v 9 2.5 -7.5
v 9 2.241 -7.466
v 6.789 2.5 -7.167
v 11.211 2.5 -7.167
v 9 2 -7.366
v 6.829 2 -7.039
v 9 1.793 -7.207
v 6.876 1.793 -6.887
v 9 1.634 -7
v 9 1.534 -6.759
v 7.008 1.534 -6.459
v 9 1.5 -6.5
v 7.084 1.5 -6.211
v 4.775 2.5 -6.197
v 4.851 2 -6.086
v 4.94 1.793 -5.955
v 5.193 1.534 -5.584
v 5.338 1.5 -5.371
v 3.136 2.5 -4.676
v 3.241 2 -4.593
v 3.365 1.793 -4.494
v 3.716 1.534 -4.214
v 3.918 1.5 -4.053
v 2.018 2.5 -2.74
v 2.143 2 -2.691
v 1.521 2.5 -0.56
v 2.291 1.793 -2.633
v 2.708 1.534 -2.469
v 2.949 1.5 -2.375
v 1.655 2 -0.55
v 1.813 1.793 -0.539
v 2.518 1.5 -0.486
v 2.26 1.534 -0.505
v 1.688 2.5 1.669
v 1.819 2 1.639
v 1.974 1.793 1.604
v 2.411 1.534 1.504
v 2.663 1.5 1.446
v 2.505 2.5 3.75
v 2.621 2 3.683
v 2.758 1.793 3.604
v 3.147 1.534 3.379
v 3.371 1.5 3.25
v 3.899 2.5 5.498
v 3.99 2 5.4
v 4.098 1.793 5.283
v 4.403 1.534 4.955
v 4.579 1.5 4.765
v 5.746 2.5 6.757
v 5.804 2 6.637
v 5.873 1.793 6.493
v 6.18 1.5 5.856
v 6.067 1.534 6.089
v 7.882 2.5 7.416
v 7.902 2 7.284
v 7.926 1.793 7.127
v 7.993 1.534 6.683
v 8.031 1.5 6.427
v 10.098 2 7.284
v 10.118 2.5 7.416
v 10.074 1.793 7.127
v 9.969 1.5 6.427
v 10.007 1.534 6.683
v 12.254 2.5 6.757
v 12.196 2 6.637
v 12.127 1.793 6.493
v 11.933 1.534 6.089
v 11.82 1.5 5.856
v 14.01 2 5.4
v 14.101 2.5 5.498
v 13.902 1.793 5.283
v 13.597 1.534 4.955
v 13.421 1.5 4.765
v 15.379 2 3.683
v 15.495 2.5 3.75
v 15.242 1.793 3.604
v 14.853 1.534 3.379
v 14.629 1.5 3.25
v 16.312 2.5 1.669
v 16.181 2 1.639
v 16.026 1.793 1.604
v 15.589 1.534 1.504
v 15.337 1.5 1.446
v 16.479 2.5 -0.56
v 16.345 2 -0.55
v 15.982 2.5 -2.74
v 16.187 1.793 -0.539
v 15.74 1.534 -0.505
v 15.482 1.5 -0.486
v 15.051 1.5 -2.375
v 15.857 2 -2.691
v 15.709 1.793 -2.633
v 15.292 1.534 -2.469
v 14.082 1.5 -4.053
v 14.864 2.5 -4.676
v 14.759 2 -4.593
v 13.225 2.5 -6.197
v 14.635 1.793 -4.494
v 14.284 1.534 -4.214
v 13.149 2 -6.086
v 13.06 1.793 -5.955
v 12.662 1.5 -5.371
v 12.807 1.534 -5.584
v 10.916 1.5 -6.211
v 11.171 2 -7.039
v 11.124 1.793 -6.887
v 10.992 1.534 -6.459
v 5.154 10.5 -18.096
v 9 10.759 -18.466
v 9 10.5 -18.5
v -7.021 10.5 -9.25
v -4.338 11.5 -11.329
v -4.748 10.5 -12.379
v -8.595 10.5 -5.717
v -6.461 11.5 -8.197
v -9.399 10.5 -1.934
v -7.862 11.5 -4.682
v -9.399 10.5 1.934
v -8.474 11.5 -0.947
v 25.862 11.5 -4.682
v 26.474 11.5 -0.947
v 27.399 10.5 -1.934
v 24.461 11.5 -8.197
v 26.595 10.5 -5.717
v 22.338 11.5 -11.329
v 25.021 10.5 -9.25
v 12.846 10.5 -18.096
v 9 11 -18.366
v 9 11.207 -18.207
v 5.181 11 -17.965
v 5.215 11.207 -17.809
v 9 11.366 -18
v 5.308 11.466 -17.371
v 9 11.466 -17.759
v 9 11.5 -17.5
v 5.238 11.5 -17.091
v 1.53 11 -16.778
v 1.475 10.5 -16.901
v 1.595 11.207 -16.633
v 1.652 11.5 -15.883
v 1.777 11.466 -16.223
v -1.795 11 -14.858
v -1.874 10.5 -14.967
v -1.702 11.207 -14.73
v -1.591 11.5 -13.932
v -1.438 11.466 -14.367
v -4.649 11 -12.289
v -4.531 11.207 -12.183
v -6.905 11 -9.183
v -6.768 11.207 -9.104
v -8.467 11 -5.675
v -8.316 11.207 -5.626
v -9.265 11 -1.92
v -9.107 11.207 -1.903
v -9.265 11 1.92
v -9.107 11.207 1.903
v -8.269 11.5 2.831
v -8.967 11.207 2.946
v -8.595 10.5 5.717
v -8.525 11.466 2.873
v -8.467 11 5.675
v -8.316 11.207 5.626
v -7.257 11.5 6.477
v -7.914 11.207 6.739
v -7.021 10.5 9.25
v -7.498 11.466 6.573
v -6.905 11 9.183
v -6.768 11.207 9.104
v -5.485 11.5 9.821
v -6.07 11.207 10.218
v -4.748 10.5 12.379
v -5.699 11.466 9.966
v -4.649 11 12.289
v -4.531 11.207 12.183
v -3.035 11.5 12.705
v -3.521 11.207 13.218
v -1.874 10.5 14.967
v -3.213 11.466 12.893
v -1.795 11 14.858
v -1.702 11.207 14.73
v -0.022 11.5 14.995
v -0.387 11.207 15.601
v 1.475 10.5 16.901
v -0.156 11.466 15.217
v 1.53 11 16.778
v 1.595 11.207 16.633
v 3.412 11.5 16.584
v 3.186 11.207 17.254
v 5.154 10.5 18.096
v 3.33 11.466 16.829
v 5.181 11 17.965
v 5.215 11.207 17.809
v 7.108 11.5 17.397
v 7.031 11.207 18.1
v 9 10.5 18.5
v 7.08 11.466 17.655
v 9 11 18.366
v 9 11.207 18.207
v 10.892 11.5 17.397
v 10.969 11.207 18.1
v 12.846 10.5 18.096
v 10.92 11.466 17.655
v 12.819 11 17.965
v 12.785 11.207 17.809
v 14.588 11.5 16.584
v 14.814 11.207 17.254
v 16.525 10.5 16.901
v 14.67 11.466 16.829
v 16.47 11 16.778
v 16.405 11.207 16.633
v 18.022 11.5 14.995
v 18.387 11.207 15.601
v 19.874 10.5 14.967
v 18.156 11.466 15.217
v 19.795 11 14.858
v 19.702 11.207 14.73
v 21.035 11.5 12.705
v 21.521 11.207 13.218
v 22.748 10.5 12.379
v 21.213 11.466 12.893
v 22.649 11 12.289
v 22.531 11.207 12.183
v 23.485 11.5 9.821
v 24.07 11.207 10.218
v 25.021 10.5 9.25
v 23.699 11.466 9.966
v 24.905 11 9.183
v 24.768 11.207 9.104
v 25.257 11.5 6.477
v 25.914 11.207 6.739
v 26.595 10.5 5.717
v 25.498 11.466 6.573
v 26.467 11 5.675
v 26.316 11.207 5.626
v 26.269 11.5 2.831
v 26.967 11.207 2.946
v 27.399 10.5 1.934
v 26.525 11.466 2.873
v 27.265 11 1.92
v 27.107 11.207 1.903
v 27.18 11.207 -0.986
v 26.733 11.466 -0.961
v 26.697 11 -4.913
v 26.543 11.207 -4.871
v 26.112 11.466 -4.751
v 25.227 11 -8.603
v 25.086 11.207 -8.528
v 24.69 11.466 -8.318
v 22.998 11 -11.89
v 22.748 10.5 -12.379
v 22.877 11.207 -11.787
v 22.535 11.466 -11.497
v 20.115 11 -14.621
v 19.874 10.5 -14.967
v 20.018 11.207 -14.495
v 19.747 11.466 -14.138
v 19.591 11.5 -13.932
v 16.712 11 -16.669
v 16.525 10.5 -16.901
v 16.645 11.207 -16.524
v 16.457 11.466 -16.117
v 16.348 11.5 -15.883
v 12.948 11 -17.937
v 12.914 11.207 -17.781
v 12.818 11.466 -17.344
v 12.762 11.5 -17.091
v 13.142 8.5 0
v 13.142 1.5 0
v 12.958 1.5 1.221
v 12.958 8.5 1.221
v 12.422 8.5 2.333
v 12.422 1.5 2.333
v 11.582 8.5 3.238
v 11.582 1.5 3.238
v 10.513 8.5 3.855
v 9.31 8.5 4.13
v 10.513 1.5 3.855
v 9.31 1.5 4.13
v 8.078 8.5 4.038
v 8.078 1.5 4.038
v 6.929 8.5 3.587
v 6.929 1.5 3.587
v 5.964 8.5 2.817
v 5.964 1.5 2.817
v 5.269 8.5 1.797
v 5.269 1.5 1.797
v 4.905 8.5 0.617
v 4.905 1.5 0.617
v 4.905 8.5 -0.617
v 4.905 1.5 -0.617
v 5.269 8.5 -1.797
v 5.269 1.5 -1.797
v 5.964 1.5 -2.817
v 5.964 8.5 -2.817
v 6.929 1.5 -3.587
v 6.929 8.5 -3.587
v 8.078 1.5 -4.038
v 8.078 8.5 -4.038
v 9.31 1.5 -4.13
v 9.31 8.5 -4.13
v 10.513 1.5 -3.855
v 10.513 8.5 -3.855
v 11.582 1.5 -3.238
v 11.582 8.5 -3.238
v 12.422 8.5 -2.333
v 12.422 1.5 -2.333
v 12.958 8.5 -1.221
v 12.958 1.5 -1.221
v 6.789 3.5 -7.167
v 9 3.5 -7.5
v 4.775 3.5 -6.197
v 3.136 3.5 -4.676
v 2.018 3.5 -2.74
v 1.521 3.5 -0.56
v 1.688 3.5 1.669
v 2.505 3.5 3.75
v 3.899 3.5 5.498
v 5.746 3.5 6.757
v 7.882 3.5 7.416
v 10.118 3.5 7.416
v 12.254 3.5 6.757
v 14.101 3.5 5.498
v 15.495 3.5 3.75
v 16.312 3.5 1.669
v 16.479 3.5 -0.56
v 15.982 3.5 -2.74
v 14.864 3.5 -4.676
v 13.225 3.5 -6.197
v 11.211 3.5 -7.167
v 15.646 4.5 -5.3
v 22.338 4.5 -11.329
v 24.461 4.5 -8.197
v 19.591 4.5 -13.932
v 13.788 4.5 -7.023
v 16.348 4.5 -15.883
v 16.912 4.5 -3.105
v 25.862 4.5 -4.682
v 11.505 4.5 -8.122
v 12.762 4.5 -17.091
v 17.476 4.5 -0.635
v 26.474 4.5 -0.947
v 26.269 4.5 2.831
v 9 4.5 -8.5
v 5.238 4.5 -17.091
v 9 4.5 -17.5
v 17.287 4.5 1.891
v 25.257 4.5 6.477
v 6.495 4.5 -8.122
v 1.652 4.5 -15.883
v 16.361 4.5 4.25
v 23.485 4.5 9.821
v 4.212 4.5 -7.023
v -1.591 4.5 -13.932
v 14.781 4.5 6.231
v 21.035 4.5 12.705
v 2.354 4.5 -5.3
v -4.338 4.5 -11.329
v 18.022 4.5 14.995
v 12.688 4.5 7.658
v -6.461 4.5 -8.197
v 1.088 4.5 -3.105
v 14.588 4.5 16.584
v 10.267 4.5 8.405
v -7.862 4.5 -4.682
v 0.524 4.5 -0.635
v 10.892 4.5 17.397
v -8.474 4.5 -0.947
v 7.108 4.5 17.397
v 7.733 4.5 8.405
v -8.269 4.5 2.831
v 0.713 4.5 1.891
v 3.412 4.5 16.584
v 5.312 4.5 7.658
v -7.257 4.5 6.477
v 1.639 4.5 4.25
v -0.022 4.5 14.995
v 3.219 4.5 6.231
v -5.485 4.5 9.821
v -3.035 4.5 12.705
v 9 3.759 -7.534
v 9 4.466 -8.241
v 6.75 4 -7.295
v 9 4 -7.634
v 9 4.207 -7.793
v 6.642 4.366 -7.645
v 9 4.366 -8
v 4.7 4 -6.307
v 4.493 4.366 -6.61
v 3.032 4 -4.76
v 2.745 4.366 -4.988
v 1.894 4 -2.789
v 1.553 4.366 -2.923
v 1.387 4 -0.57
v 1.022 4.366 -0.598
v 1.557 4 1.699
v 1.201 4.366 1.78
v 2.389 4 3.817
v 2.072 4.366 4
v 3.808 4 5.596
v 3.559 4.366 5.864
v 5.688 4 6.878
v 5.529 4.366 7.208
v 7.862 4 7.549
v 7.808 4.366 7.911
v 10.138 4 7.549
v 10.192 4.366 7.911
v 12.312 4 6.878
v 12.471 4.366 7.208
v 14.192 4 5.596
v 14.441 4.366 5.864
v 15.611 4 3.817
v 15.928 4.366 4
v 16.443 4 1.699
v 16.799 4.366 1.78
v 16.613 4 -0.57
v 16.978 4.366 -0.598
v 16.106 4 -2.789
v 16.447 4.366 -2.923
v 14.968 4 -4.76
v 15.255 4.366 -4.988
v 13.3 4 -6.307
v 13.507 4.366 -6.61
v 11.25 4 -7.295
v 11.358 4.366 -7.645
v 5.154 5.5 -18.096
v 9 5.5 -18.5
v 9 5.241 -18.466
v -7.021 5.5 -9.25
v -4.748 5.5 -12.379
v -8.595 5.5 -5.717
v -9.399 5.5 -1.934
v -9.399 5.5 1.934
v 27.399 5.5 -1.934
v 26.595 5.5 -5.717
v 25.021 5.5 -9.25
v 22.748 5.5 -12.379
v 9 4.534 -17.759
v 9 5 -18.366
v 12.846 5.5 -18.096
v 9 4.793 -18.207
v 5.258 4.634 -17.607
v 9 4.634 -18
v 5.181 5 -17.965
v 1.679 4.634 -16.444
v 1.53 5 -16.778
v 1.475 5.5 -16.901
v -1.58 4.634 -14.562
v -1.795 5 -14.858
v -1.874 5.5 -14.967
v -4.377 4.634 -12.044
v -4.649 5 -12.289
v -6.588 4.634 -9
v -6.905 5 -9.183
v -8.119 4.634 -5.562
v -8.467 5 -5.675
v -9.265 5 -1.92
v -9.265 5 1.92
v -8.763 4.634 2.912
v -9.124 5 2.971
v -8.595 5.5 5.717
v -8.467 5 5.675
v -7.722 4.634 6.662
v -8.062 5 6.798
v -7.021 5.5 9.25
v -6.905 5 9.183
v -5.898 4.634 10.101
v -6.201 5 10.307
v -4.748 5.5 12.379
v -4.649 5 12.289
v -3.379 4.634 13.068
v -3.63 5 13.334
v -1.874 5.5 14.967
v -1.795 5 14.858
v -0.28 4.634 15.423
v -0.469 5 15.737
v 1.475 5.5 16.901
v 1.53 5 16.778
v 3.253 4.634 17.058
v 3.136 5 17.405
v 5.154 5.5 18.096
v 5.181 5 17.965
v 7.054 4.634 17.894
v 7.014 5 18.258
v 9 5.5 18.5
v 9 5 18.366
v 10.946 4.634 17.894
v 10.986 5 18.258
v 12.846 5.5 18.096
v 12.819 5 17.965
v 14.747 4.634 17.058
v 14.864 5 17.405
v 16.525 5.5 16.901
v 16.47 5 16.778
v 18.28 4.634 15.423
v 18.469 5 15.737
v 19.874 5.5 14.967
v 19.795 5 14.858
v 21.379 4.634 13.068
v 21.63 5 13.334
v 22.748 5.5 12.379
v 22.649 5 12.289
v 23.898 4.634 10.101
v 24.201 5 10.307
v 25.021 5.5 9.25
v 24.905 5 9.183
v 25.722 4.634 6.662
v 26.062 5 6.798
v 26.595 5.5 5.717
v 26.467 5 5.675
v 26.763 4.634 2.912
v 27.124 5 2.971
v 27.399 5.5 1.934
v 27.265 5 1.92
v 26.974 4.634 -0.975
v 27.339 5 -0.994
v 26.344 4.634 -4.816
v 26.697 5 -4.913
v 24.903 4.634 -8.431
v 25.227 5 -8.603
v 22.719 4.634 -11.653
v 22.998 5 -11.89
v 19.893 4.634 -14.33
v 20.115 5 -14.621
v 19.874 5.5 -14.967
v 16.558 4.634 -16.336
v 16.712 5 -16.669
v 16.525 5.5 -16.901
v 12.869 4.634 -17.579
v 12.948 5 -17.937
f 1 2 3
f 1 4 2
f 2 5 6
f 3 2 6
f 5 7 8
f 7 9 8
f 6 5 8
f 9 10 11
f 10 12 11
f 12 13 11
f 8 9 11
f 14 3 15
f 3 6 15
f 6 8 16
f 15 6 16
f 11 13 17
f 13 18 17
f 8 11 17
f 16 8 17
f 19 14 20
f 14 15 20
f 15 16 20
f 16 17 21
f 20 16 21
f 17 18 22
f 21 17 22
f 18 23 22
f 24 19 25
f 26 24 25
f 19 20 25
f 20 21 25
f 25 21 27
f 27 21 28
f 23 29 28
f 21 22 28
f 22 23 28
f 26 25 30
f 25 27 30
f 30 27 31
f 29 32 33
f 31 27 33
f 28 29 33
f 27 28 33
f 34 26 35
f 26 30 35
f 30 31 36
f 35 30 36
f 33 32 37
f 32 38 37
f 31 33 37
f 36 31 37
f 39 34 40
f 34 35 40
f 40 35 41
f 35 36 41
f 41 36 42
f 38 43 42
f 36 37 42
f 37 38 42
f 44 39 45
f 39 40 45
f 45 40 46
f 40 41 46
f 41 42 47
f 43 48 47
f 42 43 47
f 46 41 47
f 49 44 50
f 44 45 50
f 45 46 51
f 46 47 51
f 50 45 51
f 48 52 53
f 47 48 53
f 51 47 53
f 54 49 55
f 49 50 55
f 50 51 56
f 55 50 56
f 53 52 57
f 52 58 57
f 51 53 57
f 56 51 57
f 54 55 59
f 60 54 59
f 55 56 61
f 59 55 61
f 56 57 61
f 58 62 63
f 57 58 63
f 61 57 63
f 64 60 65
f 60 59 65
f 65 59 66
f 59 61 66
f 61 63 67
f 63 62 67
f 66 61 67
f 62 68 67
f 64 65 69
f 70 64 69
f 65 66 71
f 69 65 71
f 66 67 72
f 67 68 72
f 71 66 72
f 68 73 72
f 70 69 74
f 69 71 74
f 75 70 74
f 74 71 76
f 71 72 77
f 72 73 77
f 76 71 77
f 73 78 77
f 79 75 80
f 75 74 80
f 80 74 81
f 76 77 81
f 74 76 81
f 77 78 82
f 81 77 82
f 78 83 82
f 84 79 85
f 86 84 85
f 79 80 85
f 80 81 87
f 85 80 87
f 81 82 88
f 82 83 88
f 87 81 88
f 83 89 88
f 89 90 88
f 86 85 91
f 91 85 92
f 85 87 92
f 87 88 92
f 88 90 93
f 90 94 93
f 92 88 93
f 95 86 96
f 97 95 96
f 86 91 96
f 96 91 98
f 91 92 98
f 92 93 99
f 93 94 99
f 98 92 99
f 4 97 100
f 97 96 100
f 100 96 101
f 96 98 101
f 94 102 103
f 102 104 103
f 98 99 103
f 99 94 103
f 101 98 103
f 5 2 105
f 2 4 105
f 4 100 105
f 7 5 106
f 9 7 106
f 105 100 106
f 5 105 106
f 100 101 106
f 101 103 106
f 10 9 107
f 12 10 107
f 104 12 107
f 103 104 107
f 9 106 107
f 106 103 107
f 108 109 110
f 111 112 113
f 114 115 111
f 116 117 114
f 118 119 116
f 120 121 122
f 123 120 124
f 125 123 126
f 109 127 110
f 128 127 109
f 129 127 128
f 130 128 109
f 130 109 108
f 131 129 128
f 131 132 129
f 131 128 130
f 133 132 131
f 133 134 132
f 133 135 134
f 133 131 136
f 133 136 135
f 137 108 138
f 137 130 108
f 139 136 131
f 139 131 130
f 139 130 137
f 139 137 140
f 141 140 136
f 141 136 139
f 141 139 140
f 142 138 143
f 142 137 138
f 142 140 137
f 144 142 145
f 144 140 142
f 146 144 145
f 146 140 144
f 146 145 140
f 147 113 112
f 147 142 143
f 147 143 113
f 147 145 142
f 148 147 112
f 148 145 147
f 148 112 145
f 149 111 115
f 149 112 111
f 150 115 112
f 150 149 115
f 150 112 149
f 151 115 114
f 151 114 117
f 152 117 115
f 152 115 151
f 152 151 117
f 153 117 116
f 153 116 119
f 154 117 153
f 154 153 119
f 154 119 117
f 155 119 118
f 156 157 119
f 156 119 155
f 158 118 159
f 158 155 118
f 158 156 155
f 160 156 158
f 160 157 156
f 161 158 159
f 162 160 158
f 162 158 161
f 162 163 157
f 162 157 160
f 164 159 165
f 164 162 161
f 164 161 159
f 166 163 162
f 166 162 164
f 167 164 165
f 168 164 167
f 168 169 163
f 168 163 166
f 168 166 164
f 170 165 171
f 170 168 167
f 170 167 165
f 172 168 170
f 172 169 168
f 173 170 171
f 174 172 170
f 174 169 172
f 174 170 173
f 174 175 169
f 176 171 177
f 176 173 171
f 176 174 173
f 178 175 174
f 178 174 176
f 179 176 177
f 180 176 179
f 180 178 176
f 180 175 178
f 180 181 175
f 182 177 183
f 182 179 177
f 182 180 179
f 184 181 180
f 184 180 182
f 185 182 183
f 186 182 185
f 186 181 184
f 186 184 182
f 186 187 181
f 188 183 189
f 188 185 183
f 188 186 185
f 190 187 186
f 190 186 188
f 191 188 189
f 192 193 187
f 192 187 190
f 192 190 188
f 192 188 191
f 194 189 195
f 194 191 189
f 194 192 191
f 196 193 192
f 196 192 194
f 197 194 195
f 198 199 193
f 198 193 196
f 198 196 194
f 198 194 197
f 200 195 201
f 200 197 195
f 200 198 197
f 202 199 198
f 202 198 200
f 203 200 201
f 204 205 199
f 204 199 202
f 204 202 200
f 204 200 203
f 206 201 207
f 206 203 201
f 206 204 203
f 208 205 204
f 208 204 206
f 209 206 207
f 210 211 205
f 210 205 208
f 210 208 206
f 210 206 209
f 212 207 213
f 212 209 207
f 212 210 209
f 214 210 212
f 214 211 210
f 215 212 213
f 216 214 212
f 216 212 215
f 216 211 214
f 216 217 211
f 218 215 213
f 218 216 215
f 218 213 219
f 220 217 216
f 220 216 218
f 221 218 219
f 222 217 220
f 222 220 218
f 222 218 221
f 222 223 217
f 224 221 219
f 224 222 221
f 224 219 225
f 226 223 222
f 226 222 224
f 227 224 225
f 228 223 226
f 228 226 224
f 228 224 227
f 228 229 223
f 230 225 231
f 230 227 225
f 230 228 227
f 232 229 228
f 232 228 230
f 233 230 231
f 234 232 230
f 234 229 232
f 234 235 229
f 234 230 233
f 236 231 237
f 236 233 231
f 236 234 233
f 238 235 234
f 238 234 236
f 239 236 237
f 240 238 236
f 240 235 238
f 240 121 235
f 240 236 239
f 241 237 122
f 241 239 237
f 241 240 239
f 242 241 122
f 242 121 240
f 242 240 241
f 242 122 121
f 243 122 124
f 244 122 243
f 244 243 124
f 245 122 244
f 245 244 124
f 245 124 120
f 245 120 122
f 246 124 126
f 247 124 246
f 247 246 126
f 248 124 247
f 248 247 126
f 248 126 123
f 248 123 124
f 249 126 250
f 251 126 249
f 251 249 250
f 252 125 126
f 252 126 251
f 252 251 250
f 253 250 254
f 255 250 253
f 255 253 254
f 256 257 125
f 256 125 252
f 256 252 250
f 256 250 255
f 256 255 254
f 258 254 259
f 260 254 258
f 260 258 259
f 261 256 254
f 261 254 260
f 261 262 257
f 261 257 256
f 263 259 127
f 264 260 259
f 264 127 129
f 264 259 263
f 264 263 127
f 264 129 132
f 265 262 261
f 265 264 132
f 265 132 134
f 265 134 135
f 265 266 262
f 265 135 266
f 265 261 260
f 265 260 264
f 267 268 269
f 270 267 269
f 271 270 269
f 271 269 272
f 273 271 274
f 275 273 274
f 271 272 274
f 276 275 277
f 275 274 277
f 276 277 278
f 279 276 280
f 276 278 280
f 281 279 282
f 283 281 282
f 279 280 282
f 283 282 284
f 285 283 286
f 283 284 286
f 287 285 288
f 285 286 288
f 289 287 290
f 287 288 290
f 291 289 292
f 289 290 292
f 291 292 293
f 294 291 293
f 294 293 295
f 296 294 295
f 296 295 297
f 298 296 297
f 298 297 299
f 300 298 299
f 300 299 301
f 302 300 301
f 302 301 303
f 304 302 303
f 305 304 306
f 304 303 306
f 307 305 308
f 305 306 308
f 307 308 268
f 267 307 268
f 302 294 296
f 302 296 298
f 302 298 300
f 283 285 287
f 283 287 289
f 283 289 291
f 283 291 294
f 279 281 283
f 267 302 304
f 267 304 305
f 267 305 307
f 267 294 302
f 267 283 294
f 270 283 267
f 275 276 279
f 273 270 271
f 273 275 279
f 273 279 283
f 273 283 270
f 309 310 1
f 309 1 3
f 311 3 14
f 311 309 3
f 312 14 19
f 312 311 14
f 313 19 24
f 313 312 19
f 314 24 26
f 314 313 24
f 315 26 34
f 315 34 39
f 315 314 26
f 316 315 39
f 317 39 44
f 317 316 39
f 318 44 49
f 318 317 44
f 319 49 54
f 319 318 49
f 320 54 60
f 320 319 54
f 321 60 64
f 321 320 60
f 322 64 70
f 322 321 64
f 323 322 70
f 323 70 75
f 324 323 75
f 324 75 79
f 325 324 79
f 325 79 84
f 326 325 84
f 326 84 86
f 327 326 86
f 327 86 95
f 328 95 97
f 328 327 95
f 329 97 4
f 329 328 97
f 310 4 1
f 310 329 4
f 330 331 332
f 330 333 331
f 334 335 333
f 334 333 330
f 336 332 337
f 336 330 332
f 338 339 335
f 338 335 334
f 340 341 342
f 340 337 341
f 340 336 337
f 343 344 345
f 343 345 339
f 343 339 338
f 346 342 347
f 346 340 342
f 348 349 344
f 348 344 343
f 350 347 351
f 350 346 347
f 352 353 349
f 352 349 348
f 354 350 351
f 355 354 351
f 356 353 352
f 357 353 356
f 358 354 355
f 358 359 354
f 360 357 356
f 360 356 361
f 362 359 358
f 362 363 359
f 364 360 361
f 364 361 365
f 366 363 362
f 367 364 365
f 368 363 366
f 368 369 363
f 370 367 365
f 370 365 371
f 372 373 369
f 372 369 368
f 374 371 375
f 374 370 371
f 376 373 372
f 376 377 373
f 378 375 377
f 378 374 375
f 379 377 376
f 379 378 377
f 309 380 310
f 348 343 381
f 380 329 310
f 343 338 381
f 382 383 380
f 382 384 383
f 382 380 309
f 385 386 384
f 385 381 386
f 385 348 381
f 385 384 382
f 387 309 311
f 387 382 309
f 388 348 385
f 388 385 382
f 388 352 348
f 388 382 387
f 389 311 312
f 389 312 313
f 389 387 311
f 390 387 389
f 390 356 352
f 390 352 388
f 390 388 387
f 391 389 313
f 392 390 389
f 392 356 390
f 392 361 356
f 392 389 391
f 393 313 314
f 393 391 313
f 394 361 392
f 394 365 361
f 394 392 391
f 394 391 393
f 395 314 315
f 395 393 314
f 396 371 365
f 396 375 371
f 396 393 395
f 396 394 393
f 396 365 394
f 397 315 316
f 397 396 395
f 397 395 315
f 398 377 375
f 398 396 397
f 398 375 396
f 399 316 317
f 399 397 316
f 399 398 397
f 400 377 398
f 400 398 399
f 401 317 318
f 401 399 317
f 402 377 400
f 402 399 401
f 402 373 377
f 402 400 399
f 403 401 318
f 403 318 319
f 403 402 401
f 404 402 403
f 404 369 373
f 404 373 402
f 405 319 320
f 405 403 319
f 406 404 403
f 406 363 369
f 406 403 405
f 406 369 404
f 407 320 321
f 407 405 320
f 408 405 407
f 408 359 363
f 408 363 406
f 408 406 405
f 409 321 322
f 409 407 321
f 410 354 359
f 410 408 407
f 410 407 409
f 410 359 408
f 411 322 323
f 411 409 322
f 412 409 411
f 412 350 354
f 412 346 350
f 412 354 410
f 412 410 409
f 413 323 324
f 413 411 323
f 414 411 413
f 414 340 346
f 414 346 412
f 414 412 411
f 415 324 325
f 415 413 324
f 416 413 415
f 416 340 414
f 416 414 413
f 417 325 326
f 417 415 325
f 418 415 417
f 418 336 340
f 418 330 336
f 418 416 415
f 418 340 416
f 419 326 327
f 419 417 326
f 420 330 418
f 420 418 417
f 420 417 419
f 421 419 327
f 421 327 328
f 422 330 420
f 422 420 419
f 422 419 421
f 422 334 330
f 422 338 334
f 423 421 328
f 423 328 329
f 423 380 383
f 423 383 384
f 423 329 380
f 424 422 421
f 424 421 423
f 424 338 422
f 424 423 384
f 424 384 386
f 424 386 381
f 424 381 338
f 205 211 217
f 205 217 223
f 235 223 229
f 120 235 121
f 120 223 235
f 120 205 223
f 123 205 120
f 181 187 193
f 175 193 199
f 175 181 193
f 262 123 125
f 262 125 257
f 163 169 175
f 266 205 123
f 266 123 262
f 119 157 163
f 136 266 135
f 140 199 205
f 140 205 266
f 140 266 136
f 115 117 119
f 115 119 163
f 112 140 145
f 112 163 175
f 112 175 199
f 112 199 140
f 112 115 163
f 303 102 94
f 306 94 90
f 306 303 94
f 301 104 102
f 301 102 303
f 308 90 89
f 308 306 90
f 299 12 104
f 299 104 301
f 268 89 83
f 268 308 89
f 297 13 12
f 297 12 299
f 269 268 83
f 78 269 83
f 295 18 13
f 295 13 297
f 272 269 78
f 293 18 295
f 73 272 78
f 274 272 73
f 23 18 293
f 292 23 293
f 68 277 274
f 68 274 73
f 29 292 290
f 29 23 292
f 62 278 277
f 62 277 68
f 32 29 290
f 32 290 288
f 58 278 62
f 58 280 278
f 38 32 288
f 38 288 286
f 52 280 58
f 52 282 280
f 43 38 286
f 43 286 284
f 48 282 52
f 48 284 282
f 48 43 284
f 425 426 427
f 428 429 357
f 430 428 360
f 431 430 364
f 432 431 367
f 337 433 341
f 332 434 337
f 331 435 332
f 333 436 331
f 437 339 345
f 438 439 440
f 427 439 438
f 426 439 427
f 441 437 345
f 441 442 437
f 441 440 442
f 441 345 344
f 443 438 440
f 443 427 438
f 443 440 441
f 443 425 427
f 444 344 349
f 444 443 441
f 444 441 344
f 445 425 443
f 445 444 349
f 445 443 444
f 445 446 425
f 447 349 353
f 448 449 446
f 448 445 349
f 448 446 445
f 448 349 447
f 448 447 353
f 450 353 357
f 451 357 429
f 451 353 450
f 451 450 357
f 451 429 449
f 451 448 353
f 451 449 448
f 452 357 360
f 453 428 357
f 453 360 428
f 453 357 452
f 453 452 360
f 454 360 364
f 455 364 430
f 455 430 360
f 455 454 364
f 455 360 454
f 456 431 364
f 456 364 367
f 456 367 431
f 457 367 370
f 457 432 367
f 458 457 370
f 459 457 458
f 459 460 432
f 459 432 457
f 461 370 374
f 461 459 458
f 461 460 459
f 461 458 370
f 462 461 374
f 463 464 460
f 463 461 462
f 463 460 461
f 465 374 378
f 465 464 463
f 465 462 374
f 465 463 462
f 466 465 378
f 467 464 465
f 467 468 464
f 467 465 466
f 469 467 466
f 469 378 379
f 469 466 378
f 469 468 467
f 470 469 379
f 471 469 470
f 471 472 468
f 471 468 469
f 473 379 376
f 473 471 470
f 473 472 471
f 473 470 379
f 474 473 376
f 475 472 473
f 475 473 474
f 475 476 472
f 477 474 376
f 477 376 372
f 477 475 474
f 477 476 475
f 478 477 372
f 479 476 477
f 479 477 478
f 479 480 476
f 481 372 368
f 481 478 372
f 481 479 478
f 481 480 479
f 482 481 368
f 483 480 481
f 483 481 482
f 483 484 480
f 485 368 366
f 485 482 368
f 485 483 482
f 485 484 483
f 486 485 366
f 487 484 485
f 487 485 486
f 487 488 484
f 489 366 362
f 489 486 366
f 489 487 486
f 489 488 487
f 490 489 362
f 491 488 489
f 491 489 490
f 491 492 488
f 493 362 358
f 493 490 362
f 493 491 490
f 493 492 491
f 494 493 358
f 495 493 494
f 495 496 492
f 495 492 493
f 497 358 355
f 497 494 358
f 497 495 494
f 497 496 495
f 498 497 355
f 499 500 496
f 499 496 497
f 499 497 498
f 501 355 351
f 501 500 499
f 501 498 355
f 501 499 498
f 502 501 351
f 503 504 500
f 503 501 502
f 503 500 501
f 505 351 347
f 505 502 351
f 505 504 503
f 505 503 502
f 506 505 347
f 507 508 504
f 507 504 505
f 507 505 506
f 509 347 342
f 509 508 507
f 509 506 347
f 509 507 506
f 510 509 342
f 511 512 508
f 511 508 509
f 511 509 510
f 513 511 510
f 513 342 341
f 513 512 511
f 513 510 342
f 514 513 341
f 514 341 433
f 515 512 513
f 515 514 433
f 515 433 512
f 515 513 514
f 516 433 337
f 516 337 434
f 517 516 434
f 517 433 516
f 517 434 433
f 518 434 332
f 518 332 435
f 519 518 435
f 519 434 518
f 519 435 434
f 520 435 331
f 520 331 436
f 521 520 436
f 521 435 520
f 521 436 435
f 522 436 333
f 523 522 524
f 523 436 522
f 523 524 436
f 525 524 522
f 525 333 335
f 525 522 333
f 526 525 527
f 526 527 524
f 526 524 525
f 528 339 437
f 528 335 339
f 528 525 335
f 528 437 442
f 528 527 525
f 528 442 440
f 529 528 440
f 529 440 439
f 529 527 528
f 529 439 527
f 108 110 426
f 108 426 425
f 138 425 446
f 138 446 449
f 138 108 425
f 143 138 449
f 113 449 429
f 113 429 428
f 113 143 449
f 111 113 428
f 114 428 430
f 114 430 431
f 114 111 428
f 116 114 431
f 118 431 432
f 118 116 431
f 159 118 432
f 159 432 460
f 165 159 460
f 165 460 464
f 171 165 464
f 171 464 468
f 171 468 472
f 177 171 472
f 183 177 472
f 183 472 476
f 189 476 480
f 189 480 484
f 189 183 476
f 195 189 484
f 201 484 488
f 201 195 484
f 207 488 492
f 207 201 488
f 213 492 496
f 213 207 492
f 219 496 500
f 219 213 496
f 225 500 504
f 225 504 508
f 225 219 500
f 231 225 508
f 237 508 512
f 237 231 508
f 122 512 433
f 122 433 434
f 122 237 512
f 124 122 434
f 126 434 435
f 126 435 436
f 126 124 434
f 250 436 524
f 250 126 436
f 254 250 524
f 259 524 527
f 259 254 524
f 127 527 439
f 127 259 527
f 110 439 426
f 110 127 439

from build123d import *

# Parameters (mm, degrees)
SKETCH3_R          = 4.141637382
CUT_EXTRUDE1_DEPTH = 7
FILLET2_R          = 1
FILLET3_R          = 1


with BuildPart() as part:
    # Sketch2 → Revolve1 (revolve)
    with BuildSketch(Plane.XY, mode=Mode.PRIVATE) as revolve1_sk:
        with BuildLine():
            Line((1.5, 1.5), (1.5, 3.5))
            ThreePointArc((1.5, 3.5), (1.207106781, 4.207106781), (0.5, 4.5))
            Line((0.5, 4.5), (-9.5, 4.5))
            Line((-9.5, 4.5), (-9.5, 11.5))
            Line((-9.5, 11.5), (9, 11.5))
            Line((9, 11.5), (9, 1.5))
            Line((9, 1.5), (1.5, 1.5))
        make_face()
    revolve(revolve1_sk.sketch.rotate(Axis((9, 1.5, 0), (0, 1, 0)), 270), axis=Axis((9, 1.5, 0), (0, 1, 0)))

    # Sketch3 → Cut-Extrude1 (cut)
    with BuildSketch(Plane.XZ.offset(-1.5)):
        with Locations((9, 0)):
            Circle(SKETCH3_R)
    extrude(amount=-CUT_EXTRUDE1_DEPTH, mode=Mode.SUBTRACT)

    # Fillet2
    fillet2_edges = [part.edges().sort_by_distance(p)[0] for p in [
        (9, 4.5, 18.5),
        (9, 11.5, 18.5),
    ]]
    fillet(fillet2_edges, radius=FILLET2_R)

    # Fillet3
    fillet3_edges = [part.edges().sort_by_distance(p)[0] for p in [
        (9, 1.5, 7.5),
    ]]
    fillet(fillet3_edges, radius=FILLET3_R)


solid = part.part
